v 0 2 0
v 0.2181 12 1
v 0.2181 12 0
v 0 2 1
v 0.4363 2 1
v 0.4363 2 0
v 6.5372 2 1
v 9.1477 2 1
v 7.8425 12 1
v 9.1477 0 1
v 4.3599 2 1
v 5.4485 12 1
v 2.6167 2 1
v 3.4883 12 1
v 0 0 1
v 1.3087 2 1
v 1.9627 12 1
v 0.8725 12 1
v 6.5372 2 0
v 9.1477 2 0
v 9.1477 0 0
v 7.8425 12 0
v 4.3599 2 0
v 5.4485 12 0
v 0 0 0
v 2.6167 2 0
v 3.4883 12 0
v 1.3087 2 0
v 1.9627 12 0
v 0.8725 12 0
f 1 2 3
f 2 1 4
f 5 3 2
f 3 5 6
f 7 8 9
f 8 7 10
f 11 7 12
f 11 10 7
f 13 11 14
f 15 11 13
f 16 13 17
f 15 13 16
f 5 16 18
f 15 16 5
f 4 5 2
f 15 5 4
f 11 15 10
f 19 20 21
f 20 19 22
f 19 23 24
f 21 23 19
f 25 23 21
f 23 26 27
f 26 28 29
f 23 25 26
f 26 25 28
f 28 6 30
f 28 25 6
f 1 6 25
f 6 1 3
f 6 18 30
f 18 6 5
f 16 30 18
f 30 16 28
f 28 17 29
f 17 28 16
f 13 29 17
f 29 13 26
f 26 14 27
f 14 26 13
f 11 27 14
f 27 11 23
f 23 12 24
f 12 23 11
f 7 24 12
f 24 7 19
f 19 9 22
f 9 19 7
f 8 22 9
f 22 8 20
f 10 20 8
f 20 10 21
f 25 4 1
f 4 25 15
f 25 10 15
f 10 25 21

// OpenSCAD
function sum(list) = list ? [for(p = list) 1] * list : 0;

module tooth(angle) {
	width = sin(angle / 2) * 20;
	difference() {
		translate([width / 2, 0, 0]) {
			scale([width / 20, 1, 1]) {
				cylinder(h=1, r=10, $fn=4);
			}
		}
		translate([0, -10, -1]) {
			cube([width, 10, 3]);
		}
	}
}

cube([sum([for(prev_a = [2.5 : 2.5 : 15]) sin(prev_a / 2) * 20]), 2, 1]);
for(a = [2.5 : 2.5 : 15]) {
	x = sum([for(prev_a = [2.5 : 2.5 : a - 2.5]) sin(prev_a / 2) * 20]);
	translate([x, 2, 0]) {
		tooth(a);
	}
}
